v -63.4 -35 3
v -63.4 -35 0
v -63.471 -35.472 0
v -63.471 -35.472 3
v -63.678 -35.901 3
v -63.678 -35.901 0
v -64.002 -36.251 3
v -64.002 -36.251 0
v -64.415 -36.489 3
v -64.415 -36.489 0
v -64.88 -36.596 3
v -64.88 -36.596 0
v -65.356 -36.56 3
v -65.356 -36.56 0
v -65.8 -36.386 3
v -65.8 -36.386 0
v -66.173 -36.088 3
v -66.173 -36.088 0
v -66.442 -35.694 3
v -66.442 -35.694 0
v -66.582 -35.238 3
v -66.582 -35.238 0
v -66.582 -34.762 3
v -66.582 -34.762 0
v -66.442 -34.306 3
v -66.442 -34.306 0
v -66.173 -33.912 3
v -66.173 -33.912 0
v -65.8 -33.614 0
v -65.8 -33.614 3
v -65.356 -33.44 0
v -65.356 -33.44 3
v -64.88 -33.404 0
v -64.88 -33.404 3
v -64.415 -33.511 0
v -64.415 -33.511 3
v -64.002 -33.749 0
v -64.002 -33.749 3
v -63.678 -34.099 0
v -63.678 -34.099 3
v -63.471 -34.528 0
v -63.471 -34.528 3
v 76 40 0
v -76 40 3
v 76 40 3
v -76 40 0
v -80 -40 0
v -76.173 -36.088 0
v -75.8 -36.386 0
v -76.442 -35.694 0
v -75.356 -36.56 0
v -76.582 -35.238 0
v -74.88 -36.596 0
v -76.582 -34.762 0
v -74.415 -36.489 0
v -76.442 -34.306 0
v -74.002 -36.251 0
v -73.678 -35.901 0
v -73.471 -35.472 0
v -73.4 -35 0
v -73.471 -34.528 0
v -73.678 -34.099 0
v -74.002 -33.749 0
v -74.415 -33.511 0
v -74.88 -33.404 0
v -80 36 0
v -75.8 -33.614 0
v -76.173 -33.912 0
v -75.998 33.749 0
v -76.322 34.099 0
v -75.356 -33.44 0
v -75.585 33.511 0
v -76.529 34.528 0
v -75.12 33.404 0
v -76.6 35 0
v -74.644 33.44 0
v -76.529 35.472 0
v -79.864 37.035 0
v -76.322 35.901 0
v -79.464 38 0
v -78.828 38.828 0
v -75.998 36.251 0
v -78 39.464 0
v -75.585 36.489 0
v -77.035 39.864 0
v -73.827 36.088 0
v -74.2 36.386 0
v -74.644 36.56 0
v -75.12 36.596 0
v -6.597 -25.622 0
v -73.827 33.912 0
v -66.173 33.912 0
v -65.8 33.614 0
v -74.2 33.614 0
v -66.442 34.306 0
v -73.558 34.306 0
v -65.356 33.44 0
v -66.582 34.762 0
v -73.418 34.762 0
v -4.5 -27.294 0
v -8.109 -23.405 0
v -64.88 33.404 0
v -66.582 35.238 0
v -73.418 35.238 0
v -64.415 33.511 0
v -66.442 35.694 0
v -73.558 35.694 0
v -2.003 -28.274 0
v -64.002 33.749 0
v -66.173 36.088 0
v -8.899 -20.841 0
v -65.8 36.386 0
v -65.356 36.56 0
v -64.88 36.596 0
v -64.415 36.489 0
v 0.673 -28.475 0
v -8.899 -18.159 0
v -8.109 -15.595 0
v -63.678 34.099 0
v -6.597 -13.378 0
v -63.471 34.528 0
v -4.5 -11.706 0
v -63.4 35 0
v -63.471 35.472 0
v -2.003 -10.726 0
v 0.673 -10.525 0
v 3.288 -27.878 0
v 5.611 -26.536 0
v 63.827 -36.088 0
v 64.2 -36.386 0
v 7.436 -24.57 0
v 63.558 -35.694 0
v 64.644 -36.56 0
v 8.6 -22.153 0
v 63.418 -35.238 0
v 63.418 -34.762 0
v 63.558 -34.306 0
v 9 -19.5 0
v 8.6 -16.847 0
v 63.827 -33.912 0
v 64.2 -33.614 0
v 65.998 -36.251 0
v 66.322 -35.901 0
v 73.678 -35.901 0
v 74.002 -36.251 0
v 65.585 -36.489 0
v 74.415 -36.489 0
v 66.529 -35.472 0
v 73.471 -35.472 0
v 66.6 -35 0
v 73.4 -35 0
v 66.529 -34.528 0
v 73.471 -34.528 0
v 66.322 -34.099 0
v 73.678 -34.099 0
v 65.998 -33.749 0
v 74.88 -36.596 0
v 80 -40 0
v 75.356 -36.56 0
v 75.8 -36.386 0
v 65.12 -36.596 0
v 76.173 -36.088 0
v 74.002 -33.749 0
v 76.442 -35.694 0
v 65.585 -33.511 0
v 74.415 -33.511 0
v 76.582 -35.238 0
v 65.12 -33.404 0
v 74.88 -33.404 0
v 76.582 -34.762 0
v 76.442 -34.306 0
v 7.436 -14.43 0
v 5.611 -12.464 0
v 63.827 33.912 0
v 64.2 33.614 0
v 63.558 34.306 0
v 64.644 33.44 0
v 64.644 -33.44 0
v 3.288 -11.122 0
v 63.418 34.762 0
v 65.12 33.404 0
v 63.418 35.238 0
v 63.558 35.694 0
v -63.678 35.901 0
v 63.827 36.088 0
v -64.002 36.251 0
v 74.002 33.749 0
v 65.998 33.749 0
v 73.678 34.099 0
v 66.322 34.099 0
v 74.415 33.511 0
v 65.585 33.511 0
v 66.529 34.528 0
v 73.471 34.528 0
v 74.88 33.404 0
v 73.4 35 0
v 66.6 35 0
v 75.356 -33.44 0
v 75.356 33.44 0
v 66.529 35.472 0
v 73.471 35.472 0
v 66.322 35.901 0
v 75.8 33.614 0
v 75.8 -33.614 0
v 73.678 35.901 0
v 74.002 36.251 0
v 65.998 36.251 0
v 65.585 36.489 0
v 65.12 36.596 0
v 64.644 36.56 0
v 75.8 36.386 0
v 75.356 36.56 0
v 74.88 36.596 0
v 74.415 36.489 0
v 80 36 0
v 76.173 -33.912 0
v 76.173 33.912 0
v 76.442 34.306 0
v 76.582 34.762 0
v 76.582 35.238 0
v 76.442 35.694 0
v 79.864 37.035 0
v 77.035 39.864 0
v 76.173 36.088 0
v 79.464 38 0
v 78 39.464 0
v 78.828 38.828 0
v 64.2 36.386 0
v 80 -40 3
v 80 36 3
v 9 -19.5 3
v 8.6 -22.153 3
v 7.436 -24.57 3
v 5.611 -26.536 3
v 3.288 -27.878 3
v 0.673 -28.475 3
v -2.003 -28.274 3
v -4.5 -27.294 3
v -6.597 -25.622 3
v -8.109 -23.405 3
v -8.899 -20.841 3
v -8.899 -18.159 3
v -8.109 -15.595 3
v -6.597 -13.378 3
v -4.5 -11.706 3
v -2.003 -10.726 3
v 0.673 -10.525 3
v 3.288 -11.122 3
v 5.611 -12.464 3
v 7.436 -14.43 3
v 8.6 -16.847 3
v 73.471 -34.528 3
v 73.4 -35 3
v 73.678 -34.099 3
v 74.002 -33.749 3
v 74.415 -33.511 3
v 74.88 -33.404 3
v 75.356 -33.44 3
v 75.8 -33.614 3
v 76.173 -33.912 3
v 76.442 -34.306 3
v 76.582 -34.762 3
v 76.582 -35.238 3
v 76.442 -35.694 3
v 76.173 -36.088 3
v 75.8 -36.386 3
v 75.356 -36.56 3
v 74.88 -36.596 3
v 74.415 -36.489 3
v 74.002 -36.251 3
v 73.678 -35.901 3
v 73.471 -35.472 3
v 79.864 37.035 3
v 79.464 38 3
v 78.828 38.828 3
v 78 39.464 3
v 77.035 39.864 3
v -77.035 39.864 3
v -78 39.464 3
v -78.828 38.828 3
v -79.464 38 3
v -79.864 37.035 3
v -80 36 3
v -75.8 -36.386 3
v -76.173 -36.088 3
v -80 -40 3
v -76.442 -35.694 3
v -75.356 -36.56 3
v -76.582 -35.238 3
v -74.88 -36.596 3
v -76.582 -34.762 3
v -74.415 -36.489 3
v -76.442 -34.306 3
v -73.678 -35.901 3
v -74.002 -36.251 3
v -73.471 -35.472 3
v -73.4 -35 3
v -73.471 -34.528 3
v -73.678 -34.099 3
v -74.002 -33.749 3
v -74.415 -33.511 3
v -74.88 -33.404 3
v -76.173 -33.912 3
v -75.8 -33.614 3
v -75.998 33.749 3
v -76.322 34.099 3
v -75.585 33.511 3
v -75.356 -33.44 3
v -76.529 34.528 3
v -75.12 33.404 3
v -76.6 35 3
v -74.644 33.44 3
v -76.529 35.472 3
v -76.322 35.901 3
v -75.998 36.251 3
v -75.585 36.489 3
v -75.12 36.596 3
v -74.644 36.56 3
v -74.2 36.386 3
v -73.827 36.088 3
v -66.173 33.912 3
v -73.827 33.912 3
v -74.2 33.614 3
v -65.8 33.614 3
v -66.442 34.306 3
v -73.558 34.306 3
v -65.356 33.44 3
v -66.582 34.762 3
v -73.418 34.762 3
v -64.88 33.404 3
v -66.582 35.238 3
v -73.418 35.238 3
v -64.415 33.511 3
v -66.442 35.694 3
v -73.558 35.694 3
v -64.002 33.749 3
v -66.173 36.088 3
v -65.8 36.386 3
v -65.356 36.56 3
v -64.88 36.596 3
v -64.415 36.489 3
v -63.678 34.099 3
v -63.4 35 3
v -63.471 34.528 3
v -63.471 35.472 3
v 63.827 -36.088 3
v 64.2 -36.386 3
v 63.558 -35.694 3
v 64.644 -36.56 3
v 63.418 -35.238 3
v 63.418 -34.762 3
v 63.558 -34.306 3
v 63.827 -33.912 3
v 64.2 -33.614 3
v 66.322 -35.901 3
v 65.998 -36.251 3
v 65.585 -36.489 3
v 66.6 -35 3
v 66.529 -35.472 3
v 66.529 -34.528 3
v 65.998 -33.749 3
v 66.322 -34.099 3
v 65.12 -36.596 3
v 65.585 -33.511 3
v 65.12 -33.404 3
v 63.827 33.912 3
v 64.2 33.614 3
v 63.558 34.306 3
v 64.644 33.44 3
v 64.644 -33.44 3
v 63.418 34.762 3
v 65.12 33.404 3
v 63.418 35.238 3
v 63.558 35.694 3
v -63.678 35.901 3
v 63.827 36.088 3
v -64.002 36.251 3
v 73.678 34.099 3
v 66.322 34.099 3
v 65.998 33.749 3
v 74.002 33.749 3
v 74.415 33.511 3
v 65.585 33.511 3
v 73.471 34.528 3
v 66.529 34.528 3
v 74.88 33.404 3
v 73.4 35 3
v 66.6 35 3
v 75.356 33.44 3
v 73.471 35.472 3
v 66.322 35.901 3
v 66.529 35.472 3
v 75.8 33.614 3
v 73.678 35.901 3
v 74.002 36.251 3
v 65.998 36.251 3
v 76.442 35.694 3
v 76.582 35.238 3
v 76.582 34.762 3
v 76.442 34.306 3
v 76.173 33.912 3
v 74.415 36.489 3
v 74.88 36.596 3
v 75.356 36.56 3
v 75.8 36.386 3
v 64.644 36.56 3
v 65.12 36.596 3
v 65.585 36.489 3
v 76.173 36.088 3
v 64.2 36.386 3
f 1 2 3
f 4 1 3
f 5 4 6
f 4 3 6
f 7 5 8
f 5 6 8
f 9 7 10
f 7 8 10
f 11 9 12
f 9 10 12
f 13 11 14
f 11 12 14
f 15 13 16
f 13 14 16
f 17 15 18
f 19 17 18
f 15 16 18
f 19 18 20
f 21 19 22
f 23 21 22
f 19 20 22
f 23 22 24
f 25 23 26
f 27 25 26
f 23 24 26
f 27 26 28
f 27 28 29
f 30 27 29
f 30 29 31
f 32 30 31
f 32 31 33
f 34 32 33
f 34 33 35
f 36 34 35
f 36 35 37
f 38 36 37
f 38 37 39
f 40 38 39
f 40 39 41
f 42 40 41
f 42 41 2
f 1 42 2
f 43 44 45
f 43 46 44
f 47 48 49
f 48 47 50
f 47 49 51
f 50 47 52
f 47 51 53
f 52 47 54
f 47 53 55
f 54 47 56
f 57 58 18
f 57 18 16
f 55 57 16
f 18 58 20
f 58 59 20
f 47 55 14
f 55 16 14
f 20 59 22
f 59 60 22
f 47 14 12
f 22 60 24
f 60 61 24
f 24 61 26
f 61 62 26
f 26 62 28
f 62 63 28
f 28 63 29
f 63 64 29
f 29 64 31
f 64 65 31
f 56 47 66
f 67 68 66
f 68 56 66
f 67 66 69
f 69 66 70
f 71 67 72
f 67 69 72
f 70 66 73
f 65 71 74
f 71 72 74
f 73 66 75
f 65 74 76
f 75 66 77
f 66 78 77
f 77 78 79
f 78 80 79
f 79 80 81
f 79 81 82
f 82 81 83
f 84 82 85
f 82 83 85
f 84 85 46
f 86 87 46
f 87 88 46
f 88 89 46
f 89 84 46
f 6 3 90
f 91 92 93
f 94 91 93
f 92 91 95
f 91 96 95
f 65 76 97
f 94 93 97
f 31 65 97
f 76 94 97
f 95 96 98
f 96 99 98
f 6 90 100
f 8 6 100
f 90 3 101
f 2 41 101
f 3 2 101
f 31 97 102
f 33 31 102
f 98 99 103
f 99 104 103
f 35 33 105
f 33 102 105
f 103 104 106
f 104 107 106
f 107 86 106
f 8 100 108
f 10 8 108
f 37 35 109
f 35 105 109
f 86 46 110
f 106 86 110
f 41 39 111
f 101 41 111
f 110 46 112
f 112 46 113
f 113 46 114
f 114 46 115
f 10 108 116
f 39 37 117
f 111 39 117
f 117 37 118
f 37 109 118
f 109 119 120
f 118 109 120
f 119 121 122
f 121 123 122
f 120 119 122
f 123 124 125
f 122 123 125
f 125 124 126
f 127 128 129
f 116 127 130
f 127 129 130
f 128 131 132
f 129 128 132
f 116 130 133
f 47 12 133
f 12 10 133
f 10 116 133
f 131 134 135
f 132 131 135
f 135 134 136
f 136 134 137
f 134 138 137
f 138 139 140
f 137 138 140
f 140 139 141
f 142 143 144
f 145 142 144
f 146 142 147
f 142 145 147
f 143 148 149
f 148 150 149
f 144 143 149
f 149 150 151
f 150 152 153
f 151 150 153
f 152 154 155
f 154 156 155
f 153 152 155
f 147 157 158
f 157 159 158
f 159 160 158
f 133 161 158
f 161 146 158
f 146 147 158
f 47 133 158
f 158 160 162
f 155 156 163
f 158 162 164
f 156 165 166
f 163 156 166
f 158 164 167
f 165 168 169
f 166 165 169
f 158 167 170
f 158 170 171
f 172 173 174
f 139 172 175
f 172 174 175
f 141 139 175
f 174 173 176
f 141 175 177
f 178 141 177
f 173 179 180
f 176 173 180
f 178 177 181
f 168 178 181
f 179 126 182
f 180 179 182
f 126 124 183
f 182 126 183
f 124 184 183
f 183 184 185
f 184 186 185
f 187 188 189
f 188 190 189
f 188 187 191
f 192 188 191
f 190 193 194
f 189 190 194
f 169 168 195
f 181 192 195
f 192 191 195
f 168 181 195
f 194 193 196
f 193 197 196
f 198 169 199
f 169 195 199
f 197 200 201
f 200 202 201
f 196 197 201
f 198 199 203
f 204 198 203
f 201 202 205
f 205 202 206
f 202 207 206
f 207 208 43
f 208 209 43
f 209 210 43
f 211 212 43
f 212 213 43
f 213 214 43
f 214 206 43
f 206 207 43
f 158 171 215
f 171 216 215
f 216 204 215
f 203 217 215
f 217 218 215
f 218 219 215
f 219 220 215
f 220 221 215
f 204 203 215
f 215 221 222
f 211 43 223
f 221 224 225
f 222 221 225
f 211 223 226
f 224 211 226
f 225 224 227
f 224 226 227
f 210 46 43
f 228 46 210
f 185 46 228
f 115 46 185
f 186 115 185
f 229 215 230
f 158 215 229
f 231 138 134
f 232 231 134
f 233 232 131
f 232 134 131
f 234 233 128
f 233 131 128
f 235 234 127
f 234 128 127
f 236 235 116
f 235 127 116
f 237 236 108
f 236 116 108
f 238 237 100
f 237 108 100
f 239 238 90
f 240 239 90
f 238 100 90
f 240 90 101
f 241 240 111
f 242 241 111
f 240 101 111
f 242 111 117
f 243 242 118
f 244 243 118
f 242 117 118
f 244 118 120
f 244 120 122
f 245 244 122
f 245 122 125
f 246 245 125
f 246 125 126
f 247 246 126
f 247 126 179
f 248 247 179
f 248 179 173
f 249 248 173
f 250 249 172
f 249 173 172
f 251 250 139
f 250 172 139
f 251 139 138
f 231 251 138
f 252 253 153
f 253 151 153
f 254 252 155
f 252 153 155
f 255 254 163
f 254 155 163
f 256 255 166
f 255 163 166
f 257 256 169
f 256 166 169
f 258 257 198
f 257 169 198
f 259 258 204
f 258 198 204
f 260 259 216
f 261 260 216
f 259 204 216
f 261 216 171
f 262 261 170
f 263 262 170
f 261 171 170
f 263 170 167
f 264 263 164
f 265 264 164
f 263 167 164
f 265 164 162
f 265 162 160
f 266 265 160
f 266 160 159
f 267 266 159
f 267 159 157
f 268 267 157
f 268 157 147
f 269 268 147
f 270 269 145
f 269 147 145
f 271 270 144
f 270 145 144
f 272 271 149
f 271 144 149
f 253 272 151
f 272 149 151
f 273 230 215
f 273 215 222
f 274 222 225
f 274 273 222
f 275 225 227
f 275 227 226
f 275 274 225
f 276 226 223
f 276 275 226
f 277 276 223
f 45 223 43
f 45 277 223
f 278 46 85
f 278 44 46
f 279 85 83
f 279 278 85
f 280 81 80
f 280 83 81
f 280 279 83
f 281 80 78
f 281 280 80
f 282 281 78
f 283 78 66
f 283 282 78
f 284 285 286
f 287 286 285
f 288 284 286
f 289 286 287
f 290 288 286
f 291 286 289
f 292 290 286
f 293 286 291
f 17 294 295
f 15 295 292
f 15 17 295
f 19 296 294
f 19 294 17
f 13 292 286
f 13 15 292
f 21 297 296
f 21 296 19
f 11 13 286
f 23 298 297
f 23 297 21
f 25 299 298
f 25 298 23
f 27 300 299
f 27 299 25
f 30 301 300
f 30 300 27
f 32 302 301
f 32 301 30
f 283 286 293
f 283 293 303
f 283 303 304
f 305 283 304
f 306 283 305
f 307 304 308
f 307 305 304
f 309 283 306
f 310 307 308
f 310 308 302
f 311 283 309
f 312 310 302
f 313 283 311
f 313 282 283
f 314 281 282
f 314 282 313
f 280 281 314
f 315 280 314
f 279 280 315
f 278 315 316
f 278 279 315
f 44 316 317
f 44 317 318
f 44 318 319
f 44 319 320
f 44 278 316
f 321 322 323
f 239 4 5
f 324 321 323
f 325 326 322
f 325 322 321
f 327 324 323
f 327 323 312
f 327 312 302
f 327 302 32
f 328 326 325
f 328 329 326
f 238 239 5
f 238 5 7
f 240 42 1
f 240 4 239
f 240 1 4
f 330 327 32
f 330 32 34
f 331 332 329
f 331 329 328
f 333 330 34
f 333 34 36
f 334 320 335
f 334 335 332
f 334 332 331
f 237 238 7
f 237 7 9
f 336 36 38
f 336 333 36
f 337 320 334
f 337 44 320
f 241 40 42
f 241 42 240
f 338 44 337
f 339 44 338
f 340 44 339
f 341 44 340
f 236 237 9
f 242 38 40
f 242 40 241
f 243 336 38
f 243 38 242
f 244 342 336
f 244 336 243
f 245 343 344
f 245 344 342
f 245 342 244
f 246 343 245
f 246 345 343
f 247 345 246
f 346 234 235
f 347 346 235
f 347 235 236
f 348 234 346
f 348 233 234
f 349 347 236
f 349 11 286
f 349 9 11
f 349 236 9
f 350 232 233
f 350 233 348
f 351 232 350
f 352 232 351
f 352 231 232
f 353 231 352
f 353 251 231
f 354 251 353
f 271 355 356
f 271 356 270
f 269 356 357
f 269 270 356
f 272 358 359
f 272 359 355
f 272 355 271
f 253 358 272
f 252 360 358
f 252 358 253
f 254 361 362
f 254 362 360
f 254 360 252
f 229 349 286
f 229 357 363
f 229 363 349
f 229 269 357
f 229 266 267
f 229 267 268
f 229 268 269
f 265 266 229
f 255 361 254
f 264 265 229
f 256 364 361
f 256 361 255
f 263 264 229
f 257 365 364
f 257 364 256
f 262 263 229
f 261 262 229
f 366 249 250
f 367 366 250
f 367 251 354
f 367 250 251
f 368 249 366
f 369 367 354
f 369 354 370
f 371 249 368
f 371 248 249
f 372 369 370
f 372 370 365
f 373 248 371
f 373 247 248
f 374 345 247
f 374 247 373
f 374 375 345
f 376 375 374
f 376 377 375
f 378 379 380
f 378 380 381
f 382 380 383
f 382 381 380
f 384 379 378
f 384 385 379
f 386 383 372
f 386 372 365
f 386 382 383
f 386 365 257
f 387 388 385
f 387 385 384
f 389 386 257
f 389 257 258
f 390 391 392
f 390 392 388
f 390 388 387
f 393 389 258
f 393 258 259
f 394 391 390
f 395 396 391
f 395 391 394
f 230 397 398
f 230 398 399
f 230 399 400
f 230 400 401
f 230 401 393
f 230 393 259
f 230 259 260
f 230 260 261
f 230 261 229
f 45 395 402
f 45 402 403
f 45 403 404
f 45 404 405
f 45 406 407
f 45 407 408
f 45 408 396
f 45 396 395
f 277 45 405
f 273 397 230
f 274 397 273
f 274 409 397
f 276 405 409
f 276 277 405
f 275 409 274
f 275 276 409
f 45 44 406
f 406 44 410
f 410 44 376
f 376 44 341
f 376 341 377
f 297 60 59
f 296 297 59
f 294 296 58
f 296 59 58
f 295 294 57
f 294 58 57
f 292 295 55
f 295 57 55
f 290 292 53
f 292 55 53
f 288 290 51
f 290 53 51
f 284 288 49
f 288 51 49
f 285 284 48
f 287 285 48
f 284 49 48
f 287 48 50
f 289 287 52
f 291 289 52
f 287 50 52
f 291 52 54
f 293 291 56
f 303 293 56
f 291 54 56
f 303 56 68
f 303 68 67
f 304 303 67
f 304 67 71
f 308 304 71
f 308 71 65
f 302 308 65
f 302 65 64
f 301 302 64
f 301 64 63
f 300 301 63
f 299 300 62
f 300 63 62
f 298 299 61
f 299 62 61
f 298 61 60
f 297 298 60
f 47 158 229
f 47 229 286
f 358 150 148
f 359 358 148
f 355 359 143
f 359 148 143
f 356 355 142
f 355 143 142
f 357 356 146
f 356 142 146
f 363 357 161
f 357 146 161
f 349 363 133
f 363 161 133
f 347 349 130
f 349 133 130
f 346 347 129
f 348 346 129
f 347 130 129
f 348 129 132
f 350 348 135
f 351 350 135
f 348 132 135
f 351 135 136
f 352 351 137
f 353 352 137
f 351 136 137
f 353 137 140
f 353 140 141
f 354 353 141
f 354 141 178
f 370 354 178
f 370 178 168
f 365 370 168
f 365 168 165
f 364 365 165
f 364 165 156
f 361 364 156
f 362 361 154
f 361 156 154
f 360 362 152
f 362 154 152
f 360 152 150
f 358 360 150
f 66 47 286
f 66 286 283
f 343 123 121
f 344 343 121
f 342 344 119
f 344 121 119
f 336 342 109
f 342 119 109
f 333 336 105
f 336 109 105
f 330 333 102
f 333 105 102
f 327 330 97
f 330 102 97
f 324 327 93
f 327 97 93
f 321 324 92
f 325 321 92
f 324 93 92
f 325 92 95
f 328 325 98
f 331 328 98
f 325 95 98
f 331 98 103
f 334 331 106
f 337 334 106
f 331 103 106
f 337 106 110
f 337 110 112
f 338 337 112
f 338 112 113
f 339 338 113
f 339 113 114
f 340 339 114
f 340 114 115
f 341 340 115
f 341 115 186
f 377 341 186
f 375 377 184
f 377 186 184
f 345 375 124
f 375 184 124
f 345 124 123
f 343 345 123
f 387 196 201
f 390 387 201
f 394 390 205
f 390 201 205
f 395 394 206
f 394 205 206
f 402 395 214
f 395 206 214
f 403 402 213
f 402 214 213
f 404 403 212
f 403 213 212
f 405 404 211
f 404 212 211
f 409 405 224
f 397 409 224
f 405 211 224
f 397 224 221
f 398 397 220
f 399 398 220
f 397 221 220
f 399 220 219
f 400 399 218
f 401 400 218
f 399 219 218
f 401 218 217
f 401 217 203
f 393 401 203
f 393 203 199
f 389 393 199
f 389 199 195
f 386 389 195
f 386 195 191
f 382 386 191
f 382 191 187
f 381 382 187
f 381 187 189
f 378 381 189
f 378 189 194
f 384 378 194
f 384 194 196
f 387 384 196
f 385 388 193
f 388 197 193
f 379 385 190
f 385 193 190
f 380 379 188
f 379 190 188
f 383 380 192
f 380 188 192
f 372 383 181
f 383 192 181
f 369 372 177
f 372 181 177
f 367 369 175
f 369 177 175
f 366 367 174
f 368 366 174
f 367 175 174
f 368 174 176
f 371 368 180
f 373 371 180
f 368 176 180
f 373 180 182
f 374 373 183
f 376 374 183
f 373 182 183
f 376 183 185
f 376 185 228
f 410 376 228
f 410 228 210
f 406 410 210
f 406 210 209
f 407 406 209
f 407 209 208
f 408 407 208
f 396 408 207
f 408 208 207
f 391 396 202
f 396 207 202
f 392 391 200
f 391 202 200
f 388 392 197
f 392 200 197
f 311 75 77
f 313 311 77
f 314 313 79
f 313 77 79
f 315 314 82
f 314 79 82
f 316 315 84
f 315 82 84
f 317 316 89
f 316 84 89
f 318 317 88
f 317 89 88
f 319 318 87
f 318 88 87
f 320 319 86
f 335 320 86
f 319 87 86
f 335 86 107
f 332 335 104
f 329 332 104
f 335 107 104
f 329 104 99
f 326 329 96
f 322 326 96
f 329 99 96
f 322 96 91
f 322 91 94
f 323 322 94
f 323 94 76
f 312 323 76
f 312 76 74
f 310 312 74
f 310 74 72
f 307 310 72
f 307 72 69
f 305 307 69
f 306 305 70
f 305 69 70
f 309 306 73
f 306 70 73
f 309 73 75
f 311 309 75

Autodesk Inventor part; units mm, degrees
ref_plane "YZ Plane" through (0, 0, 0) normal (1, 0, 0) x (0, 1, 0)
ref_plane "XZ Plane" through (0, 0, 0) normal (0, 1, 0) x (-1, 0, 0)
ref_plane "XY Plane" through (0, 0, 0) normal (0, 0, 1) x (1, 0, 0)
sketch "スケッチ1" plane through (0, 0, 0) normal (0, 0, 1) x (1, 0, 0)
  point P0 (0, 0)
sketch "スケッチ2" plane through (0, 0, 0) normal (0, 0, 1) x (1, 0, 0)
  line L0 (80, -40) -> (-80, -40)
  line L1 (-80, -40) -> (-80, 40)
  line L2 (-80, 40) -> (80, 40)
  line L3 (80, 40) -> (80, -40)
  line L4 (80, -40) -> (-80, 40) construction
  line L5 (-80, -40) -> (80, 40) construction
  circle A0 centre (-48, -19.5) radius 6.05
  circle A1 centre (48, -19.5) radius 12.55
  circle A2 centre (48, -19.5) radius 17.5
  circle A3 centre (65.5, -19.5) radius 2.05
  circle A4 centre (48, -2) radius 2.05
  circle A5 centre (30.5, -19.5) radius 2.05
  circle A6 centre (48, -37) radius 2.05
  circle A7 centre (-48, -19.5) radius 9
  circle A8 centre (-57, -19.5) radius 1.6
  circle A9 centre (-48, -28.5) radius 1.6
  circle A10 centre (-39, -19.5) radius 1.6
  circle A11 centre (-48, -10.5) radius 1.6
  line L6 (75, 35) -> (-75, 35)
  line L7 (-75, 35) -> (-75, -35)
  line L8 (-75, -35) -> (75, -35)
  line L9 (75, -35) -> (75, 35)
  line L10 (-75, 35) -> (-75, 35) construction
  line L11 (-76.6, 35) -> (-76.6, 35)
  line L12 (-73.4, 35) -> (-73.4, 35)
  arc A12 (-73.4, 35) -> (-76.6, 35) centre (-75, 35) ccw
  arc A13 (-76.6, 35) -> (-73.4, 35) centre (-75, 35) ccw
  line L13 (-75, 35) -> (-75, 35) construction
  line L14 (-75, -35) -> (-75, -35) construction
  line L15 (-73.4, -35) -> (-73.4, -35)
  line L16 (-76.6, -35) -> (-76.6, -35)
  arc A14 (-76.6, -35) -> (-73.4, -35) centre (-75, -35) ccw
  arc A15 (-73.4, -35) -> (-76.6, -35) centre (-75, -35) ccw
  line L17 (-75, -35) -> (-75, -35) construction
  line L18 (75, 35) -> (75, 35) construction
  line L19 (73.4, 35) -> (73.4, 35)
  line L20 (76.6, 35) -> (76.6, 35)
  arc A16 (76.6, 35) -> (73.4, 35) centre (75, 35) ccw
  arc A17 (73.4, 35) -> (76.6, 35) centre (75, 35) ccw
  line L21 (75, 35) -> (75, 35) construction
  line L22 (75, -35) -> (75, -35) construction
  line L23 (76.6, -35) -> (76.6, -35)
  line L24 (73.4, -35) -> (73.4, -35)
  arc A18 (73.4, -35) -> (76.6, -35) centre (75, -35) ccw
  arc A19 (76.6, -35) -> (73.4, -35) centre (75, -35) ccw
  line L25 (75, -35) -> (75, -35) construction
  line L26 (-80, -19.5) -> (80, -19.5)
  circle A20 centre (0, -19.5) radius 9
  circle A21 centre (0, -19.5) radius 39
  line L27 (-85, 40) -> (85, 40)
  line L28 (85, 40) -> (85, 35)
  line L29 (85, 35) -> (-85, 35)
  line L30 (-85, 35) -> (-85, 40)
  line L31 (-85, 35) -> (0, 0)
  line L32 (0, 0) -> (85, 35)
  line L33 (-80, 0) -> (80, 0)
  line L34 (80, 0) -> (80, -50)
  line L35 (80, -50) -> (-80, -50)
  line L36 (-80, -50) -> (-80, 0)
  circle A22 centre (-65, 35) radius 1.6
  circle A23 centre (65, 35) radius 1.6
  circle A24 centre (-65, -35) radius 1.6
  circle A25 centre (65, -35) radius 1.6
  point P0 (-75, 35)
  point P1 (-75, -35)
  point P2 (75, 35)
  point P3 (75, -35)
  point P4 (-39.1422, -21.0937)
  point P5 (-39.1422, -17.9063)
  point P6 (0, 40)
  point P7 (85, 40)
  point P8 (48.45, -35)
  point P9 (47.55, -35)
  point P10 (80, 40)
  point P11 (80, 32.9412)
  point P12 (-80, 32.9412)
  point P13 (-80, 40)
  point P14 (60, -23.1746)
  point P15 (60, -15.8254)
  point P16 (0, 35)
  point P17 (-73.4, -35)
  point P18 (-76.6, -35)
  point P19 (73.4, -35)
  point P20 (76.6, -35)
  point P21 (76.6, 35)
  point P22 (73.4, 35)
  point P23 (-76.6, 35)
  point P24 (-73.4, 35)
  dimension "d9" = 35
  dimension "d15" = 18
  dimension "d0" = 160
  dimension "d1" = 80
  dimension "d5" = 12.1
  dimension "d6" = 25.1
  dimension "d10" = 4.1
  dimension "d13" = 360
  dimension "d16" = 3.2
  dimension "d19" = 360
  dimension "d21" = 5
  dimension "d22" = 0
  dimension "d23" = 90
  dimension "d24" = 3.2
  dimension "d25" = 0
  dimension "d26" = 90
  dimension "d27" = 3.2
  dimension "d28" = 0
  dimension "d29" = 90
  dimension "d30" = 3.2
  dimension "d31" = 0
  dimension "d32" = 90
  dimension "d33" = 3.2
  dimension "d36" = 20.5
  dimension "d37" = 18
  dimension "d38" = 78
  dimension "d39" = 48
  dimension "d40" = 48
  dimension "d43" = 170
  dimension "d44" = 85
  dimension "d46" = 50
  dimension "d47" = 3.2
  dimension "d48" = 3.2
  dimension "d51" = 130
  dimension "d52" = 65
extrude "押し出し1" add sketch "スケッチ2" along normal blind 3 contours L0 A21 L8 A2 A6 A25 A18 A19 L9 L26 L3 | L0 A21 L8 | L26 L9 L33 L3 | L0 L1 L26 L7 A15 A14 L8 A24 A21 | A21 A2 L8 | L8 A21 A10 L26 A20 A5 A2 | L33 L9 L32 L3 | L26 A3 A2 A4 L33 L9 | L9 A19 L8 A25 A2 A3 L26 | L8 A24 A15 L7 L26 A8 A7 A9 A10 A21 | L8 A6 A2 | A2 A21 A1 L26 A3 L8 A6 | A2 A5 L26 A1 A21 | L32 L9 A17 L29 L3 | L33 A4 A21 L32 L9 | L26 A2 A3 | A3 A2 L26 | L1 L33 L7 L26 | A21 L26 A10 | A10 A7 A21 | A6 L8 A2 | A2 A6 | A6 L8 | A5 L26 A2 | A2 L26 A5 | A21 L26 A1 | A1 L26 A21 | L29 A16 L6 A23 A22 A12 L1 L2 L3 | L32 A21 L31 L7 A13 L6 A22 A23 A17 L9 | L33 A4 | A4 A2 L33 | A3 L26 A1 A21 A2 A4 | A2 L26 A3 | A3 L26 A2 | L1 L31 L7 L33 | L7 L33 A21 A10 A7 A11 A8 L26 | A10 L26 A7 | A7 A9 A8 L26 A0 A10 | L26 A21 A10 | A10 A21 L33 A2 A5 L26 A20 | L26 A10 A7 | A7 A10 A21 | A6 L8 A2 | L26 A5 A2 | A2 A5 L26 | A5 A2 A21 A1 L26 | A1 A21 L26 | L26 A21 A1 | L32 L31 A21 | A21 L33 L32 | A4 A2 A21 L33 | A4 A2 | L1 L29 A13 L7 L31 | L7 L31 A21 L33 | L26 A7 A8 | A8 A7 L26 | A9 A7 | A7 A9 | L26 A0 A8 A7 A11 A10 | L31 L33 A21 | A8 L26 A7 | A7 L26 A8 | L26 A0 | A0 L26 | A11 A7 | A7 A11
fillet "フィレット1" radius 4 2 edges at (80, 40, 1.5) (-80, 40, 1.5)
equation "\"d27\" = d24"
equation "\"d30\" = d24"
equation "\"d33\" = d24"
equation "\"d40\" = d39"
equation "\"d44\" = 0.5 * d43"
properties part number "aaa_small_plate_no"
